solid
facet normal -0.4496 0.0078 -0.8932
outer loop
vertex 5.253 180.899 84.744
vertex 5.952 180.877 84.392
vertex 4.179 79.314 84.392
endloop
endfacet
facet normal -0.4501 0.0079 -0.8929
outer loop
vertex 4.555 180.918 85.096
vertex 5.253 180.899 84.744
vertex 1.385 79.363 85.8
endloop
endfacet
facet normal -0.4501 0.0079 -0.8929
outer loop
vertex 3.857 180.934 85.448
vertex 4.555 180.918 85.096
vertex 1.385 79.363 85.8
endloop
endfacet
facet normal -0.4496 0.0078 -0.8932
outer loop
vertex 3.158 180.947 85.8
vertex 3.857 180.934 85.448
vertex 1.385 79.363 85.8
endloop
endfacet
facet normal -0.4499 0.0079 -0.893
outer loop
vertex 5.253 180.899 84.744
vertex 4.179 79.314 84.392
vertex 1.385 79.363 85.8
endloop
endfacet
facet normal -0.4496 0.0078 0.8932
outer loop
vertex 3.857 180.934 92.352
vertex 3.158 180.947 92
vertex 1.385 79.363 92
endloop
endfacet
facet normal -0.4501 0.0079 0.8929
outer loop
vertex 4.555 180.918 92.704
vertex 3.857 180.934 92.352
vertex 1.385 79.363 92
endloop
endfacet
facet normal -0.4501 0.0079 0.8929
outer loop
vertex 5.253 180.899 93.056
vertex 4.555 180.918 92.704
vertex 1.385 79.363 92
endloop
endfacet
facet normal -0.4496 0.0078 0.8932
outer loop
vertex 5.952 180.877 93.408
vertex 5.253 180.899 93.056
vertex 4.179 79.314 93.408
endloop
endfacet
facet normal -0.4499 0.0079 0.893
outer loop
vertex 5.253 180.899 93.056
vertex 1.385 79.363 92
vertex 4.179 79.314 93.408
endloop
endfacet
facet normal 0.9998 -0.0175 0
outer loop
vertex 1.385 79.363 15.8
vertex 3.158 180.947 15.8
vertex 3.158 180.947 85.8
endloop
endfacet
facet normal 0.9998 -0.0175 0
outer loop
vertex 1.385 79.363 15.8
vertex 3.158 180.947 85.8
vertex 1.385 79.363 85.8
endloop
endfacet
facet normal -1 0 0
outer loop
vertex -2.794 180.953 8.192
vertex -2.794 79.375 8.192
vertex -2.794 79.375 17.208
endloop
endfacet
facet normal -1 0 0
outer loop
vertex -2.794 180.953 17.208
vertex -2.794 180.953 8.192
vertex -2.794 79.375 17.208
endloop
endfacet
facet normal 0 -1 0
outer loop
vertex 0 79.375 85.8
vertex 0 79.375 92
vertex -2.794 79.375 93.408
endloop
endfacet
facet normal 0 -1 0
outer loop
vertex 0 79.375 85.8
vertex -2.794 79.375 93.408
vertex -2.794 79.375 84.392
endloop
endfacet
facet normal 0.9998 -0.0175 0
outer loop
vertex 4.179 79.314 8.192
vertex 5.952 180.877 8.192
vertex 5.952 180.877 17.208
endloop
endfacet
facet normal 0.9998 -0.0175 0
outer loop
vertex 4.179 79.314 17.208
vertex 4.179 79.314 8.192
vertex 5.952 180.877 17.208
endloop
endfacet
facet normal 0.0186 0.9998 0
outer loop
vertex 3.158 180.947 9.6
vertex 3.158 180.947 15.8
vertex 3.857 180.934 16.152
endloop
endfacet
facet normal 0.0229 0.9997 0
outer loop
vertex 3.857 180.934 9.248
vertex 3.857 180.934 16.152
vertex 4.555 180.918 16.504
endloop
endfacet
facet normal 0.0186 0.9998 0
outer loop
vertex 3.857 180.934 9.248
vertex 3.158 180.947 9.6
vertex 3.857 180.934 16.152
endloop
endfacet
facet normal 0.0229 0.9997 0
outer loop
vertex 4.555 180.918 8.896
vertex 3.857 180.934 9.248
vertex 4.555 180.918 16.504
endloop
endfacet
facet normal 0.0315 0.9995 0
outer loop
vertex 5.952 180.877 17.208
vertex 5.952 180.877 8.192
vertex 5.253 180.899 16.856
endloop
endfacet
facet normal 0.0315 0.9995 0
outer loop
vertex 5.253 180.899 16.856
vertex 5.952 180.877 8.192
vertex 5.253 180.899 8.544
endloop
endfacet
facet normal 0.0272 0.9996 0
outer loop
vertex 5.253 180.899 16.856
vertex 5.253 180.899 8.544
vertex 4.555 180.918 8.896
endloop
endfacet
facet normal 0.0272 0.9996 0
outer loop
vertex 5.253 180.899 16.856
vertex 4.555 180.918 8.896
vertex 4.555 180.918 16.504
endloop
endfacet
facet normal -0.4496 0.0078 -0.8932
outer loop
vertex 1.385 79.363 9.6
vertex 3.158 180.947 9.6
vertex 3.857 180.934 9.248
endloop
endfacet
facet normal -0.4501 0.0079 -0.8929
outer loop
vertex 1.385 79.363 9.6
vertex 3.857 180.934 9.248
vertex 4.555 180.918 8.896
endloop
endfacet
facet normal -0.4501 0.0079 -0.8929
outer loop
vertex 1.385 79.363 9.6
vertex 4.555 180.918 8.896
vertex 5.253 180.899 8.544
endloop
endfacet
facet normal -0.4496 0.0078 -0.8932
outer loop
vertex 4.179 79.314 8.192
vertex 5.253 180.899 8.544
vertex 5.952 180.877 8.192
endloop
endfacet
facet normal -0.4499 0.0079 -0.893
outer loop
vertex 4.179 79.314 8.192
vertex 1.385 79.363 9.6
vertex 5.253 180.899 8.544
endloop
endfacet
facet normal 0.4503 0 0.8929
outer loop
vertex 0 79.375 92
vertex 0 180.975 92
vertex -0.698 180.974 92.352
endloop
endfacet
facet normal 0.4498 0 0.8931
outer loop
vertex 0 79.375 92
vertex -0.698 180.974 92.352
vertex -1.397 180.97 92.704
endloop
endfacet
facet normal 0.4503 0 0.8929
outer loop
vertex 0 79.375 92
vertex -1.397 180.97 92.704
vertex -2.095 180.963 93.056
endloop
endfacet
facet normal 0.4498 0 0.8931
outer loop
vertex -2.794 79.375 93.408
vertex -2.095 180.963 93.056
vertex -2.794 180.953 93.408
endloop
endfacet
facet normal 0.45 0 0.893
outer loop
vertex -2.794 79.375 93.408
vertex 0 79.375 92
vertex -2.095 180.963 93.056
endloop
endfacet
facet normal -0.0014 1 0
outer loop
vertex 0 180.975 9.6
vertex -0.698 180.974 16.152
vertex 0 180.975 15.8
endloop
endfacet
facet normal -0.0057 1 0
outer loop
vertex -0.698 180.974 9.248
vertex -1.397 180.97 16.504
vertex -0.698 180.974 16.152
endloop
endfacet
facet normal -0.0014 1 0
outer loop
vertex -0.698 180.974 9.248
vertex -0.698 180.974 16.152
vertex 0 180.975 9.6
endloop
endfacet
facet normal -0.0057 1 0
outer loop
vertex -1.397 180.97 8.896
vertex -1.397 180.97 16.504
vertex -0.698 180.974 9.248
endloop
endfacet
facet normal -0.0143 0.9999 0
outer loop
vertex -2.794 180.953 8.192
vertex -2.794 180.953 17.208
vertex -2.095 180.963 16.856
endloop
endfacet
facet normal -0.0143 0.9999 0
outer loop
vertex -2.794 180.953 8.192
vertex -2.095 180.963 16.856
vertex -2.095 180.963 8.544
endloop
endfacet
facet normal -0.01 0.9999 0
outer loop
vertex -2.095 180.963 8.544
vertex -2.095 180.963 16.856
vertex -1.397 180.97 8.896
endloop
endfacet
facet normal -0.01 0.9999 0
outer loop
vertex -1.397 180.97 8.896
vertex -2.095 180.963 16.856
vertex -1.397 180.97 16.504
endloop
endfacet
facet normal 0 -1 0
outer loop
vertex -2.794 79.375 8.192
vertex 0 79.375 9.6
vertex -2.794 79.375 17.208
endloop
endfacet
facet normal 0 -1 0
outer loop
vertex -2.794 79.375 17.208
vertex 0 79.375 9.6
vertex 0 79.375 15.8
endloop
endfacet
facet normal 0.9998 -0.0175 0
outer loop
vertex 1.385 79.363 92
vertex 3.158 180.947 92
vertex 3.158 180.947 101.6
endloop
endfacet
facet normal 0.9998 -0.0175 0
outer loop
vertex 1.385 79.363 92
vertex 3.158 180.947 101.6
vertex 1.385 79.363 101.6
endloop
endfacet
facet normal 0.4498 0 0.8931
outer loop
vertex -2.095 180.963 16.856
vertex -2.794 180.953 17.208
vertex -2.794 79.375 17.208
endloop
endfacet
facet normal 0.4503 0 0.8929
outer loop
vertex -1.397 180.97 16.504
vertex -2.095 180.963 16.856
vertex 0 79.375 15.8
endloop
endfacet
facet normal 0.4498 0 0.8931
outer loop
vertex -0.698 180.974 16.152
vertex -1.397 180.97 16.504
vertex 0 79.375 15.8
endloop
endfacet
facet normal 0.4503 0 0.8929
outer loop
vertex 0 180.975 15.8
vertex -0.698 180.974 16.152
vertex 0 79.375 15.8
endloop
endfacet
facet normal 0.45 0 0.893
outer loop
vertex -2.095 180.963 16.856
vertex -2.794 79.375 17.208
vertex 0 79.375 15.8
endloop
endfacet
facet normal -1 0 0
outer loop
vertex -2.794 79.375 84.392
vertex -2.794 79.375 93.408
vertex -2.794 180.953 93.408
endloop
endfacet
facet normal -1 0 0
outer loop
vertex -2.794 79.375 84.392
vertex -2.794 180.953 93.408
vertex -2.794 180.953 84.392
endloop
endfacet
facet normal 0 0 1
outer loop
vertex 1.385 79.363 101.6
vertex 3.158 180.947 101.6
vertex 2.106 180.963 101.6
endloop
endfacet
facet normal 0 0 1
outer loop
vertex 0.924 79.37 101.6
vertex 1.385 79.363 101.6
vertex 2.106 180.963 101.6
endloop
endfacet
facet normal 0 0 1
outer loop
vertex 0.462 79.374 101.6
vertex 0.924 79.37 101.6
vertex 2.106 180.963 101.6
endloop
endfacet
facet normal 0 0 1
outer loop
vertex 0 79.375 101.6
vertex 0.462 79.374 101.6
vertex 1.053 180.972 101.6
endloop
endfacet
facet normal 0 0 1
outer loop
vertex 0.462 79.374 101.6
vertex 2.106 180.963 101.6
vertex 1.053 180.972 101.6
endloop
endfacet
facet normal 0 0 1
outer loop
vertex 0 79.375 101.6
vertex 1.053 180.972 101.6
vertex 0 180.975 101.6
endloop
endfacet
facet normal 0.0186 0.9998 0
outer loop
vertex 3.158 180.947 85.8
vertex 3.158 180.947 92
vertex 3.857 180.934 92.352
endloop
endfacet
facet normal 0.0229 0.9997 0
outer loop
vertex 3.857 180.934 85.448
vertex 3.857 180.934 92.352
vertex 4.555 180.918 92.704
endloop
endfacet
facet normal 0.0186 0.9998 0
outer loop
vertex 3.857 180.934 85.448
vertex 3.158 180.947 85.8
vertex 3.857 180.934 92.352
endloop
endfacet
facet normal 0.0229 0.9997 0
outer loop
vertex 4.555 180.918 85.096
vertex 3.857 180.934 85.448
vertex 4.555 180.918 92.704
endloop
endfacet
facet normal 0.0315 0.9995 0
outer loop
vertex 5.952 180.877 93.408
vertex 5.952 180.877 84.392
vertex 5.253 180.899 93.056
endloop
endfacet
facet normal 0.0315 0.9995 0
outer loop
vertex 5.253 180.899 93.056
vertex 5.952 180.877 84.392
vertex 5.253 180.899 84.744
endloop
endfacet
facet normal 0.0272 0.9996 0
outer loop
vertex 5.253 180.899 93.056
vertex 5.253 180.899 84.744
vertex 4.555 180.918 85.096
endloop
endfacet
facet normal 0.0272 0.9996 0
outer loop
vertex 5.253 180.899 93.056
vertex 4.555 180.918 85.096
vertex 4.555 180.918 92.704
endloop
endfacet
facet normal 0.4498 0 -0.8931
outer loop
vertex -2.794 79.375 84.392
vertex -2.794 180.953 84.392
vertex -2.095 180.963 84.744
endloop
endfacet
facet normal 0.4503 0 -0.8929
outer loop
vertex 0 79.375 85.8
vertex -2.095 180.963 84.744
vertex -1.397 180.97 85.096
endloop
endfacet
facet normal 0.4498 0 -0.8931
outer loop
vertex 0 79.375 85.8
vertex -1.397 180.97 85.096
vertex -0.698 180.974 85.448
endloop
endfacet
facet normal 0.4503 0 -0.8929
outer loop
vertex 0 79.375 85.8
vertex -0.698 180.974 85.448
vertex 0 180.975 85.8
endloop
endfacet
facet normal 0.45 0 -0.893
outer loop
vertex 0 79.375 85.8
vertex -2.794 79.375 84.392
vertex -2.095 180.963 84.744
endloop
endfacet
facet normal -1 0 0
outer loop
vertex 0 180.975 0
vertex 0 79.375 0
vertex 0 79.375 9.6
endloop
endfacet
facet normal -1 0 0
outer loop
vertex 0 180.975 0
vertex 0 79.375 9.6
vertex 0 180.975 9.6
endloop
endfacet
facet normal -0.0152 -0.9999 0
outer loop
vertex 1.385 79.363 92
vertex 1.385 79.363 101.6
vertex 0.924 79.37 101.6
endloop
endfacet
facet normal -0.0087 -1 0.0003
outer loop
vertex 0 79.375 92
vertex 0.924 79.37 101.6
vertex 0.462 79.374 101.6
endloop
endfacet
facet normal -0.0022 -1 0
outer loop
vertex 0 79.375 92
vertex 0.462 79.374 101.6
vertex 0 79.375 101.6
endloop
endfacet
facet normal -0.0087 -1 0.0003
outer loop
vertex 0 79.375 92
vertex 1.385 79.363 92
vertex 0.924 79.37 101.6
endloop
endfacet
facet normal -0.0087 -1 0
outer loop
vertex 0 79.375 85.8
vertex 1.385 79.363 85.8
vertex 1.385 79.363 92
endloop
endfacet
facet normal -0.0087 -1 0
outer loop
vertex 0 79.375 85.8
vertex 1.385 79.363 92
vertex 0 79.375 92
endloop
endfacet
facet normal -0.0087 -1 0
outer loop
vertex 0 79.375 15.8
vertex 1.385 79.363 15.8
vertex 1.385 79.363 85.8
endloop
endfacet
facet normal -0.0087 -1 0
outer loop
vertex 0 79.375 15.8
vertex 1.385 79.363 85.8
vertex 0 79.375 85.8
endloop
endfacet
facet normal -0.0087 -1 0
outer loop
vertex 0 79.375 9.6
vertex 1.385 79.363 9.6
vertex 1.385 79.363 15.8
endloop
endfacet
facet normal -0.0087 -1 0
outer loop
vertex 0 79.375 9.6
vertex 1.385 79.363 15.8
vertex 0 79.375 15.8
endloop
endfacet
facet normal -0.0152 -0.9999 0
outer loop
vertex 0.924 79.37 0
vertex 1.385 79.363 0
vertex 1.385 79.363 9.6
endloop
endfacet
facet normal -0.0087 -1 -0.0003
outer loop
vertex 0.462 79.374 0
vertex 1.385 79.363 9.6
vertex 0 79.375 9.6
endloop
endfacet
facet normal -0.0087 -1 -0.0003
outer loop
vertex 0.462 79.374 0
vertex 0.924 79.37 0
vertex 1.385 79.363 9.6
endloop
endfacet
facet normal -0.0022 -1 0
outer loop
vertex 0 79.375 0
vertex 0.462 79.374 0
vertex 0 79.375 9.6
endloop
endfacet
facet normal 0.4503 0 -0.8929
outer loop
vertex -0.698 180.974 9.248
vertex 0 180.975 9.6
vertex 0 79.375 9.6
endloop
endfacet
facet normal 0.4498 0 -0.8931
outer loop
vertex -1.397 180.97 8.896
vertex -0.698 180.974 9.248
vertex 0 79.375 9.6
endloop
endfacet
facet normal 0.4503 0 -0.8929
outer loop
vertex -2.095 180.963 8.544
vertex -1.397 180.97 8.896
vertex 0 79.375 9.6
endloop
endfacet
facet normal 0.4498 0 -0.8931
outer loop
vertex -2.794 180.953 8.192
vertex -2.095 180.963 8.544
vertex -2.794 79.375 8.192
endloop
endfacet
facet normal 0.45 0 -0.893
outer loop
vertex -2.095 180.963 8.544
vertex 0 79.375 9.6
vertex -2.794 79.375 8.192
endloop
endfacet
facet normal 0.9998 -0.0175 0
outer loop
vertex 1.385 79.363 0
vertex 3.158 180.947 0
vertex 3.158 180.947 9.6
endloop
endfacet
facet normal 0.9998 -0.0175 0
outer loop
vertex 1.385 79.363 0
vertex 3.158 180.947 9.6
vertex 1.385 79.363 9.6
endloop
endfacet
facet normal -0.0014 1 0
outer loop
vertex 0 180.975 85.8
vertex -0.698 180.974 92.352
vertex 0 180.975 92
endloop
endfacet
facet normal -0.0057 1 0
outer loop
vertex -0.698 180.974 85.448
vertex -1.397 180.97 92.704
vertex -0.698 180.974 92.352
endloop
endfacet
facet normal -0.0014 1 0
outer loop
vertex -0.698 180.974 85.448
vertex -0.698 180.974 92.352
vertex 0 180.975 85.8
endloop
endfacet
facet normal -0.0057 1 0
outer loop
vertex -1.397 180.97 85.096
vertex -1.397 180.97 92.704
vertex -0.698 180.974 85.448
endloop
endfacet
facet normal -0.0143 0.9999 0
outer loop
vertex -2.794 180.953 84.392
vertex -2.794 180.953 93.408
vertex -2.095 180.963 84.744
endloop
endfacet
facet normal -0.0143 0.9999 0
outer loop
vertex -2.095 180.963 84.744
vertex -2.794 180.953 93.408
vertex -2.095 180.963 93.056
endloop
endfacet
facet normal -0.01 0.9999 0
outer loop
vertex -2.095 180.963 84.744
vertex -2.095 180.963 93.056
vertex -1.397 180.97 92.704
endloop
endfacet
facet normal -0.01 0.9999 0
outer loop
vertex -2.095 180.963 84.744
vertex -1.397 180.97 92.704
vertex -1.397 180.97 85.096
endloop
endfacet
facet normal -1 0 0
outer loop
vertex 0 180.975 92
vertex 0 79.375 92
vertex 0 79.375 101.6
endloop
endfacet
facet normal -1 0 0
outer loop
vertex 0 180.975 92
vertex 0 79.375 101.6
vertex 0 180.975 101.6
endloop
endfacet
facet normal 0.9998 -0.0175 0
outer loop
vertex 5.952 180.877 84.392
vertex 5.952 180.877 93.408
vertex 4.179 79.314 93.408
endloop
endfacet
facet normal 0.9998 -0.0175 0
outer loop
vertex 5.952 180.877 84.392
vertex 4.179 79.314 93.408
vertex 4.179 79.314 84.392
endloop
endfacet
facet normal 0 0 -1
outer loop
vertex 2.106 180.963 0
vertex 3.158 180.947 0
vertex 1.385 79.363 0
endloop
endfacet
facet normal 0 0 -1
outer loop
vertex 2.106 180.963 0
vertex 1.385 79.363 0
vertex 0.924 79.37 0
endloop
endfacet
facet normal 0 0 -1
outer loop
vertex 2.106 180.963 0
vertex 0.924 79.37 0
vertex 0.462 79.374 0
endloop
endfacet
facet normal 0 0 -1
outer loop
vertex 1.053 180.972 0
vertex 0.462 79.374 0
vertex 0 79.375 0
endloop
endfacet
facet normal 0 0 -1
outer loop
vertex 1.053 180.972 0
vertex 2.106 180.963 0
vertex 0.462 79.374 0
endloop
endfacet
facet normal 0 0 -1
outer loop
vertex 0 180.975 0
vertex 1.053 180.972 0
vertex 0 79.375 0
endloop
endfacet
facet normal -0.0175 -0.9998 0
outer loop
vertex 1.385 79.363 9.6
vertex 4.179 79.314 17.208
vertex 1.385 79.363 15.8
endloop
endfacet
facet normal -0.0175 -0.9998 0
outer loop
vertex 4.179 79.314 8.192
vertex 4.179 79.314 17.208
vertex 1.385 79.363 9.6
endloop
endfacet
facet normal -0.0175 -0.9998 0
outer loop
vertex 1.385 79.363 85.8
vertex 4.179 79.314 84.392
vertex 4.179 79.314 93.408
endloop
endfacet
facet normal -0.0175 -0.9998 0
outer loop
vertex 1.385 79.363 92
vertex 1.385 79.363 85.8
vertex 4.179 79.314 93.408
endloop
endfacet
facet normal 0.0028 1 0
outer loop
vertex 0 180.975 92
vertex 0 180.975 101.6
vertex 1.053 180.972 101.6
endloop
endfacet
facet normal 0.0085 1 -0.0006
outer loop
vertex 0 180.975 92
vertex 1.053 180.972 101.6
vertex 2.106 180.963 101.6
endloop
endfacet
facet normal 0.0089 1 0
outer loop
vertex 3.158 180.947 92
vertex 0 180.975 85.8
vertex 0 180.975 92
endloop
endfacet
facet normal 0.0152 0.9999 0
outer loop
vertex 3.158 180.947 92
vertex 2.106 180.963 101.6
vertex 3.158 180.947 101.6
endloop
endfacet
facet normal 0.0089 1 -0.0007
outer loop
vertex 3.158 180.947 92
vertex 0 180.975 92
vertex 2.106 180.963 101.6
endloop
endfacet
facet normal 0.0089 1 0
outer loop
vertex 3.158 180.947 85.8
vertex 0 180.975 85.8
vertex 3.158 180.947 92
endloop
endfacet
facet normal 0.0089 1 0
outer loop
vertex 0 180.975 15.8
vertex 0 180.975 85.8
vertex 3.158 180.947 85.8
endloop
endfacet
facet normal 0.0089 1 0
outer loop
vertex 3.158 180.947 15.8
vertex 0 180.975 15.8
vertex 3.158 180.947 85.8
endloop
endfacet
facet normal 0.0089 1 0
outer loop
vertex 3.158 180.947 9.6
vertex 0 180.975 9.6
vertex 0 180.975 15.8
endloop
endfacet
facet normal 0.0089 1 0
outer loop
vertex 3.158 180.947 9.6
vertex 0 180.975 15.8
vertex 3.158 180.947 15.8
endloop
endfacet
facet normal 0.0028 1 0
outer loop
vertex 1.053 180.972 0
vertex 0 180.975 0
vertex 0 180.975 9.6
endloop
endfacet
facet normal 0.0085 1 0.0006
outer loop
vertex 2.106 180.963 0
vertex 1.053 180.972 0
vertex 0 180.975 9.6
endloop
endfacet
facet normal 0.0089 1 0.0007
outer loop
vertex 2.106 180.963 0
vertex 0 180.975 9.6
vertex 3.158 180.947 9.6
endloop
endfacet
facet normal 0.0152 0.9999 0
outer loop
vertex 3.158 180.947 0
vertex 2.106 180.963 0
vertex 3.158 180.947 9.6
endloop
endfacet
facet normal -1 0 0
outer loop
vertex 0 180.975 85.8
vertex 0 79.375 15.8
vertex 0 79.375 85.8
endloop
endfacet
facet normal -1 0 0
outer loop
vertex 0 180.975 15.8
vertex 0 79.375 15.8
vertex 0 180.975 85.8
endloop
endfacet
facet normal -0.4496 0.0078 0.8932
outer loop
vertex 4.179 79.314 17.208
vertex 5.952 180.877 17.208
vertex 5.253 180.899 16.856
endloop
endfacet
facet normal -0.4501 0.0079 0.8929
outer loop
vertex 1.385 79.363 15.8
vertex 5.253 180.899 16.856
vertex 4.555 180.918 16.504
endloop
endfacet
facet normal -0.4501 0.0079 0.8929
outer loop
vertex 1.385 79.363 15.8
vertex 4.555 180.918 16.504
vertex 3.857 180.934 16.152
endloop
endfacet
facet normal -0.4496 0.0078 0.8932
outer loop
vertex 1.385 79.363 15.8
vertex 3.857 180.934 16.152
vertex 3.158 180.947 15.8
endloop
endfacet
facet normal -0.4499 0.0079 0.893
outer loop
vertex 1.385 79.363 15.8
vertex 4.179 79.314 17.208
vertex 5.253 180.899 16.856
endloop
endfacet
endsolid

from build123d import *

# Parameters (mm, degrees)
BOSS_EXTRUDE1_DEPTH      = 101.6
BOSS_EXTRUDE2_REACH      = 145.704
BOSS_EXTRUDE2_END_RADIUS = 180.975
BOSS_EXTRUDE3_REACH      = 145.807
BOSS_EXTRUDE3_END_RADIUS = 180.975


with BuildPart() as part:
    # Sketch1 → Boss-Extrude1 (new body)
    with BuildSketch(Plane.XY):
        with BuildLine():
            Line((0, 79.375), (0, 180.975))
            ThreePointArc((0, 180.975), (1.579284762, 180.968109027), (3.158449255, 180.947436631))
            Line((3.158449255, 180.947436631), (1.385284761, 79.362910803))
            ThreePointArc((1.385284761, 79.362910803), (0.692668755, 79.371977643), (0, 79.375))
        make_face()
    extrude(amount=BOSS_EXTRUDE1_DEPTH)

    # Boss-Extrude2: up to this cylinder (the profile starts inside it)
    boss_extrude2_end = Plane(origin=(0, 0, 50.8), z_dir=(0, 0, -1)) * Cylinder(BOSS_EXTRUDE2_END_RADIUS, 730.558, mode=Mode.PRIVATE)
    # Sketch2 → Boss-Extrude2 (add, up to the surface)
    with BuildSketch(Plane(origin=(1.385284761, 79.362910803, 0), x_dir=(0, 0, -1), z_dir=(-0.017452406437283553, -0.9998476951563913, 0)), mode=Mode.PRIVATE) as boss_extrude2_sk1:
        Polygon((-92.000208065, 0), (-93.4085, 2.794), (-84.3915, 2.794), (-85.799791935, 0), align=None)
    boss_extrude2_tool1 = extrude(boss_extrude2_sk1.sketch, amount=-BOSS_EXTRUDE2_REACH, mode=Mode.PRIVATE) & boss_extrude2_end
    add(boss_extrude2_tool1.solids().sort_by_distance((2.868249, 79.337026, 88.9))[0])
    # Sketch2 → Boss-Extrude2 (add, up to the surface)
    with BuildSketch(Plane(origin=(1.385284761, 79.362910803, 0), x_dir=(0, 0, -1), z_dir=(-0.017452406437283553, -0.9998476951563913, 0)), mode=Mode.PRIVATE) as boss_extrude2_sk2:
        Polygon((-15.800208065, 0), (-9.599791935, 0), (-8.1915, 2.794), (-17.2085, 2.794), align=None)
    boss_extrude2_tool2 = extrude(boss_extrude2_sk2.sketch, amount=-BOSS_EXTRUDE2_REACH, mode=Mode.PRIVATE) & boss_extrude2_end
    add(boss_extrude2_tool2.solids().sort_by_distance((2.868249, 79.337026, 12.7))[0])

    # Boss-Extrude3: up to this cylinder (the profile starts inside it)
    boss_extrude3_end = Plane(origin=(0, 0, 50.8), z_dir=(0, 0, -1)) * Cylinder(BOSS_EXTRUDE3_END_RADIUS, 730.764, mode=Mode.PRIVATE)
    # Sketch3 → Boss-Extrude3 (add, up to the surface)
    with BuildSketch(Plane(origin=(0, 79.375, 0), x_dir=(0, 0, -1), z_dir=(0, -1, 0)), mode=Mode.PRIVATE) as boss_extrude3_sk1:
        Polygon((-92.000208065, 0), (-93.4085, -2.79357446), (-84.3915, -2.79357446), (-85.799791935, 0), align=None)
    boss_extrude3_tool1 = extrude(boss_extrude3_sk1.sketch, amount=-BOSS_EXTRUDE3_REACH, mode=Mode.PRIVATE) & boss_extrude3_end
    add(boss_extrude3_tool1.solids().sort_by_distance((-1.482964, 79.375, 88.9))[0])
    # Sketch3 → Boss-Extrude3 (add, up to the surface)
    with BuildSketch(Plane(origin=(0, 79.375, 0), x_dir=(0, 0, -1), z_dir=(0, -1, 0)), mode=Mode.PRIVATE) as boss_extrude3_sk2:
        Polygon((-15.800208065, 0), (-9.599791935, 0), (-8.1915, -2.79357446), (-17.2085, -2.79357446), align=None)
    boss_extrude3_tool2 = extrude(boss_extrude3_sk2.sketch, amount=-BOSS_EXTRUDE3_REACH, mode=Mode.PRIVATE) & boss_extrude3_end
    add(boss_extrude3_tool2.solids().sort_by_distance((-1.482964, 79.375, 12.7))[0])


solid = part.part
